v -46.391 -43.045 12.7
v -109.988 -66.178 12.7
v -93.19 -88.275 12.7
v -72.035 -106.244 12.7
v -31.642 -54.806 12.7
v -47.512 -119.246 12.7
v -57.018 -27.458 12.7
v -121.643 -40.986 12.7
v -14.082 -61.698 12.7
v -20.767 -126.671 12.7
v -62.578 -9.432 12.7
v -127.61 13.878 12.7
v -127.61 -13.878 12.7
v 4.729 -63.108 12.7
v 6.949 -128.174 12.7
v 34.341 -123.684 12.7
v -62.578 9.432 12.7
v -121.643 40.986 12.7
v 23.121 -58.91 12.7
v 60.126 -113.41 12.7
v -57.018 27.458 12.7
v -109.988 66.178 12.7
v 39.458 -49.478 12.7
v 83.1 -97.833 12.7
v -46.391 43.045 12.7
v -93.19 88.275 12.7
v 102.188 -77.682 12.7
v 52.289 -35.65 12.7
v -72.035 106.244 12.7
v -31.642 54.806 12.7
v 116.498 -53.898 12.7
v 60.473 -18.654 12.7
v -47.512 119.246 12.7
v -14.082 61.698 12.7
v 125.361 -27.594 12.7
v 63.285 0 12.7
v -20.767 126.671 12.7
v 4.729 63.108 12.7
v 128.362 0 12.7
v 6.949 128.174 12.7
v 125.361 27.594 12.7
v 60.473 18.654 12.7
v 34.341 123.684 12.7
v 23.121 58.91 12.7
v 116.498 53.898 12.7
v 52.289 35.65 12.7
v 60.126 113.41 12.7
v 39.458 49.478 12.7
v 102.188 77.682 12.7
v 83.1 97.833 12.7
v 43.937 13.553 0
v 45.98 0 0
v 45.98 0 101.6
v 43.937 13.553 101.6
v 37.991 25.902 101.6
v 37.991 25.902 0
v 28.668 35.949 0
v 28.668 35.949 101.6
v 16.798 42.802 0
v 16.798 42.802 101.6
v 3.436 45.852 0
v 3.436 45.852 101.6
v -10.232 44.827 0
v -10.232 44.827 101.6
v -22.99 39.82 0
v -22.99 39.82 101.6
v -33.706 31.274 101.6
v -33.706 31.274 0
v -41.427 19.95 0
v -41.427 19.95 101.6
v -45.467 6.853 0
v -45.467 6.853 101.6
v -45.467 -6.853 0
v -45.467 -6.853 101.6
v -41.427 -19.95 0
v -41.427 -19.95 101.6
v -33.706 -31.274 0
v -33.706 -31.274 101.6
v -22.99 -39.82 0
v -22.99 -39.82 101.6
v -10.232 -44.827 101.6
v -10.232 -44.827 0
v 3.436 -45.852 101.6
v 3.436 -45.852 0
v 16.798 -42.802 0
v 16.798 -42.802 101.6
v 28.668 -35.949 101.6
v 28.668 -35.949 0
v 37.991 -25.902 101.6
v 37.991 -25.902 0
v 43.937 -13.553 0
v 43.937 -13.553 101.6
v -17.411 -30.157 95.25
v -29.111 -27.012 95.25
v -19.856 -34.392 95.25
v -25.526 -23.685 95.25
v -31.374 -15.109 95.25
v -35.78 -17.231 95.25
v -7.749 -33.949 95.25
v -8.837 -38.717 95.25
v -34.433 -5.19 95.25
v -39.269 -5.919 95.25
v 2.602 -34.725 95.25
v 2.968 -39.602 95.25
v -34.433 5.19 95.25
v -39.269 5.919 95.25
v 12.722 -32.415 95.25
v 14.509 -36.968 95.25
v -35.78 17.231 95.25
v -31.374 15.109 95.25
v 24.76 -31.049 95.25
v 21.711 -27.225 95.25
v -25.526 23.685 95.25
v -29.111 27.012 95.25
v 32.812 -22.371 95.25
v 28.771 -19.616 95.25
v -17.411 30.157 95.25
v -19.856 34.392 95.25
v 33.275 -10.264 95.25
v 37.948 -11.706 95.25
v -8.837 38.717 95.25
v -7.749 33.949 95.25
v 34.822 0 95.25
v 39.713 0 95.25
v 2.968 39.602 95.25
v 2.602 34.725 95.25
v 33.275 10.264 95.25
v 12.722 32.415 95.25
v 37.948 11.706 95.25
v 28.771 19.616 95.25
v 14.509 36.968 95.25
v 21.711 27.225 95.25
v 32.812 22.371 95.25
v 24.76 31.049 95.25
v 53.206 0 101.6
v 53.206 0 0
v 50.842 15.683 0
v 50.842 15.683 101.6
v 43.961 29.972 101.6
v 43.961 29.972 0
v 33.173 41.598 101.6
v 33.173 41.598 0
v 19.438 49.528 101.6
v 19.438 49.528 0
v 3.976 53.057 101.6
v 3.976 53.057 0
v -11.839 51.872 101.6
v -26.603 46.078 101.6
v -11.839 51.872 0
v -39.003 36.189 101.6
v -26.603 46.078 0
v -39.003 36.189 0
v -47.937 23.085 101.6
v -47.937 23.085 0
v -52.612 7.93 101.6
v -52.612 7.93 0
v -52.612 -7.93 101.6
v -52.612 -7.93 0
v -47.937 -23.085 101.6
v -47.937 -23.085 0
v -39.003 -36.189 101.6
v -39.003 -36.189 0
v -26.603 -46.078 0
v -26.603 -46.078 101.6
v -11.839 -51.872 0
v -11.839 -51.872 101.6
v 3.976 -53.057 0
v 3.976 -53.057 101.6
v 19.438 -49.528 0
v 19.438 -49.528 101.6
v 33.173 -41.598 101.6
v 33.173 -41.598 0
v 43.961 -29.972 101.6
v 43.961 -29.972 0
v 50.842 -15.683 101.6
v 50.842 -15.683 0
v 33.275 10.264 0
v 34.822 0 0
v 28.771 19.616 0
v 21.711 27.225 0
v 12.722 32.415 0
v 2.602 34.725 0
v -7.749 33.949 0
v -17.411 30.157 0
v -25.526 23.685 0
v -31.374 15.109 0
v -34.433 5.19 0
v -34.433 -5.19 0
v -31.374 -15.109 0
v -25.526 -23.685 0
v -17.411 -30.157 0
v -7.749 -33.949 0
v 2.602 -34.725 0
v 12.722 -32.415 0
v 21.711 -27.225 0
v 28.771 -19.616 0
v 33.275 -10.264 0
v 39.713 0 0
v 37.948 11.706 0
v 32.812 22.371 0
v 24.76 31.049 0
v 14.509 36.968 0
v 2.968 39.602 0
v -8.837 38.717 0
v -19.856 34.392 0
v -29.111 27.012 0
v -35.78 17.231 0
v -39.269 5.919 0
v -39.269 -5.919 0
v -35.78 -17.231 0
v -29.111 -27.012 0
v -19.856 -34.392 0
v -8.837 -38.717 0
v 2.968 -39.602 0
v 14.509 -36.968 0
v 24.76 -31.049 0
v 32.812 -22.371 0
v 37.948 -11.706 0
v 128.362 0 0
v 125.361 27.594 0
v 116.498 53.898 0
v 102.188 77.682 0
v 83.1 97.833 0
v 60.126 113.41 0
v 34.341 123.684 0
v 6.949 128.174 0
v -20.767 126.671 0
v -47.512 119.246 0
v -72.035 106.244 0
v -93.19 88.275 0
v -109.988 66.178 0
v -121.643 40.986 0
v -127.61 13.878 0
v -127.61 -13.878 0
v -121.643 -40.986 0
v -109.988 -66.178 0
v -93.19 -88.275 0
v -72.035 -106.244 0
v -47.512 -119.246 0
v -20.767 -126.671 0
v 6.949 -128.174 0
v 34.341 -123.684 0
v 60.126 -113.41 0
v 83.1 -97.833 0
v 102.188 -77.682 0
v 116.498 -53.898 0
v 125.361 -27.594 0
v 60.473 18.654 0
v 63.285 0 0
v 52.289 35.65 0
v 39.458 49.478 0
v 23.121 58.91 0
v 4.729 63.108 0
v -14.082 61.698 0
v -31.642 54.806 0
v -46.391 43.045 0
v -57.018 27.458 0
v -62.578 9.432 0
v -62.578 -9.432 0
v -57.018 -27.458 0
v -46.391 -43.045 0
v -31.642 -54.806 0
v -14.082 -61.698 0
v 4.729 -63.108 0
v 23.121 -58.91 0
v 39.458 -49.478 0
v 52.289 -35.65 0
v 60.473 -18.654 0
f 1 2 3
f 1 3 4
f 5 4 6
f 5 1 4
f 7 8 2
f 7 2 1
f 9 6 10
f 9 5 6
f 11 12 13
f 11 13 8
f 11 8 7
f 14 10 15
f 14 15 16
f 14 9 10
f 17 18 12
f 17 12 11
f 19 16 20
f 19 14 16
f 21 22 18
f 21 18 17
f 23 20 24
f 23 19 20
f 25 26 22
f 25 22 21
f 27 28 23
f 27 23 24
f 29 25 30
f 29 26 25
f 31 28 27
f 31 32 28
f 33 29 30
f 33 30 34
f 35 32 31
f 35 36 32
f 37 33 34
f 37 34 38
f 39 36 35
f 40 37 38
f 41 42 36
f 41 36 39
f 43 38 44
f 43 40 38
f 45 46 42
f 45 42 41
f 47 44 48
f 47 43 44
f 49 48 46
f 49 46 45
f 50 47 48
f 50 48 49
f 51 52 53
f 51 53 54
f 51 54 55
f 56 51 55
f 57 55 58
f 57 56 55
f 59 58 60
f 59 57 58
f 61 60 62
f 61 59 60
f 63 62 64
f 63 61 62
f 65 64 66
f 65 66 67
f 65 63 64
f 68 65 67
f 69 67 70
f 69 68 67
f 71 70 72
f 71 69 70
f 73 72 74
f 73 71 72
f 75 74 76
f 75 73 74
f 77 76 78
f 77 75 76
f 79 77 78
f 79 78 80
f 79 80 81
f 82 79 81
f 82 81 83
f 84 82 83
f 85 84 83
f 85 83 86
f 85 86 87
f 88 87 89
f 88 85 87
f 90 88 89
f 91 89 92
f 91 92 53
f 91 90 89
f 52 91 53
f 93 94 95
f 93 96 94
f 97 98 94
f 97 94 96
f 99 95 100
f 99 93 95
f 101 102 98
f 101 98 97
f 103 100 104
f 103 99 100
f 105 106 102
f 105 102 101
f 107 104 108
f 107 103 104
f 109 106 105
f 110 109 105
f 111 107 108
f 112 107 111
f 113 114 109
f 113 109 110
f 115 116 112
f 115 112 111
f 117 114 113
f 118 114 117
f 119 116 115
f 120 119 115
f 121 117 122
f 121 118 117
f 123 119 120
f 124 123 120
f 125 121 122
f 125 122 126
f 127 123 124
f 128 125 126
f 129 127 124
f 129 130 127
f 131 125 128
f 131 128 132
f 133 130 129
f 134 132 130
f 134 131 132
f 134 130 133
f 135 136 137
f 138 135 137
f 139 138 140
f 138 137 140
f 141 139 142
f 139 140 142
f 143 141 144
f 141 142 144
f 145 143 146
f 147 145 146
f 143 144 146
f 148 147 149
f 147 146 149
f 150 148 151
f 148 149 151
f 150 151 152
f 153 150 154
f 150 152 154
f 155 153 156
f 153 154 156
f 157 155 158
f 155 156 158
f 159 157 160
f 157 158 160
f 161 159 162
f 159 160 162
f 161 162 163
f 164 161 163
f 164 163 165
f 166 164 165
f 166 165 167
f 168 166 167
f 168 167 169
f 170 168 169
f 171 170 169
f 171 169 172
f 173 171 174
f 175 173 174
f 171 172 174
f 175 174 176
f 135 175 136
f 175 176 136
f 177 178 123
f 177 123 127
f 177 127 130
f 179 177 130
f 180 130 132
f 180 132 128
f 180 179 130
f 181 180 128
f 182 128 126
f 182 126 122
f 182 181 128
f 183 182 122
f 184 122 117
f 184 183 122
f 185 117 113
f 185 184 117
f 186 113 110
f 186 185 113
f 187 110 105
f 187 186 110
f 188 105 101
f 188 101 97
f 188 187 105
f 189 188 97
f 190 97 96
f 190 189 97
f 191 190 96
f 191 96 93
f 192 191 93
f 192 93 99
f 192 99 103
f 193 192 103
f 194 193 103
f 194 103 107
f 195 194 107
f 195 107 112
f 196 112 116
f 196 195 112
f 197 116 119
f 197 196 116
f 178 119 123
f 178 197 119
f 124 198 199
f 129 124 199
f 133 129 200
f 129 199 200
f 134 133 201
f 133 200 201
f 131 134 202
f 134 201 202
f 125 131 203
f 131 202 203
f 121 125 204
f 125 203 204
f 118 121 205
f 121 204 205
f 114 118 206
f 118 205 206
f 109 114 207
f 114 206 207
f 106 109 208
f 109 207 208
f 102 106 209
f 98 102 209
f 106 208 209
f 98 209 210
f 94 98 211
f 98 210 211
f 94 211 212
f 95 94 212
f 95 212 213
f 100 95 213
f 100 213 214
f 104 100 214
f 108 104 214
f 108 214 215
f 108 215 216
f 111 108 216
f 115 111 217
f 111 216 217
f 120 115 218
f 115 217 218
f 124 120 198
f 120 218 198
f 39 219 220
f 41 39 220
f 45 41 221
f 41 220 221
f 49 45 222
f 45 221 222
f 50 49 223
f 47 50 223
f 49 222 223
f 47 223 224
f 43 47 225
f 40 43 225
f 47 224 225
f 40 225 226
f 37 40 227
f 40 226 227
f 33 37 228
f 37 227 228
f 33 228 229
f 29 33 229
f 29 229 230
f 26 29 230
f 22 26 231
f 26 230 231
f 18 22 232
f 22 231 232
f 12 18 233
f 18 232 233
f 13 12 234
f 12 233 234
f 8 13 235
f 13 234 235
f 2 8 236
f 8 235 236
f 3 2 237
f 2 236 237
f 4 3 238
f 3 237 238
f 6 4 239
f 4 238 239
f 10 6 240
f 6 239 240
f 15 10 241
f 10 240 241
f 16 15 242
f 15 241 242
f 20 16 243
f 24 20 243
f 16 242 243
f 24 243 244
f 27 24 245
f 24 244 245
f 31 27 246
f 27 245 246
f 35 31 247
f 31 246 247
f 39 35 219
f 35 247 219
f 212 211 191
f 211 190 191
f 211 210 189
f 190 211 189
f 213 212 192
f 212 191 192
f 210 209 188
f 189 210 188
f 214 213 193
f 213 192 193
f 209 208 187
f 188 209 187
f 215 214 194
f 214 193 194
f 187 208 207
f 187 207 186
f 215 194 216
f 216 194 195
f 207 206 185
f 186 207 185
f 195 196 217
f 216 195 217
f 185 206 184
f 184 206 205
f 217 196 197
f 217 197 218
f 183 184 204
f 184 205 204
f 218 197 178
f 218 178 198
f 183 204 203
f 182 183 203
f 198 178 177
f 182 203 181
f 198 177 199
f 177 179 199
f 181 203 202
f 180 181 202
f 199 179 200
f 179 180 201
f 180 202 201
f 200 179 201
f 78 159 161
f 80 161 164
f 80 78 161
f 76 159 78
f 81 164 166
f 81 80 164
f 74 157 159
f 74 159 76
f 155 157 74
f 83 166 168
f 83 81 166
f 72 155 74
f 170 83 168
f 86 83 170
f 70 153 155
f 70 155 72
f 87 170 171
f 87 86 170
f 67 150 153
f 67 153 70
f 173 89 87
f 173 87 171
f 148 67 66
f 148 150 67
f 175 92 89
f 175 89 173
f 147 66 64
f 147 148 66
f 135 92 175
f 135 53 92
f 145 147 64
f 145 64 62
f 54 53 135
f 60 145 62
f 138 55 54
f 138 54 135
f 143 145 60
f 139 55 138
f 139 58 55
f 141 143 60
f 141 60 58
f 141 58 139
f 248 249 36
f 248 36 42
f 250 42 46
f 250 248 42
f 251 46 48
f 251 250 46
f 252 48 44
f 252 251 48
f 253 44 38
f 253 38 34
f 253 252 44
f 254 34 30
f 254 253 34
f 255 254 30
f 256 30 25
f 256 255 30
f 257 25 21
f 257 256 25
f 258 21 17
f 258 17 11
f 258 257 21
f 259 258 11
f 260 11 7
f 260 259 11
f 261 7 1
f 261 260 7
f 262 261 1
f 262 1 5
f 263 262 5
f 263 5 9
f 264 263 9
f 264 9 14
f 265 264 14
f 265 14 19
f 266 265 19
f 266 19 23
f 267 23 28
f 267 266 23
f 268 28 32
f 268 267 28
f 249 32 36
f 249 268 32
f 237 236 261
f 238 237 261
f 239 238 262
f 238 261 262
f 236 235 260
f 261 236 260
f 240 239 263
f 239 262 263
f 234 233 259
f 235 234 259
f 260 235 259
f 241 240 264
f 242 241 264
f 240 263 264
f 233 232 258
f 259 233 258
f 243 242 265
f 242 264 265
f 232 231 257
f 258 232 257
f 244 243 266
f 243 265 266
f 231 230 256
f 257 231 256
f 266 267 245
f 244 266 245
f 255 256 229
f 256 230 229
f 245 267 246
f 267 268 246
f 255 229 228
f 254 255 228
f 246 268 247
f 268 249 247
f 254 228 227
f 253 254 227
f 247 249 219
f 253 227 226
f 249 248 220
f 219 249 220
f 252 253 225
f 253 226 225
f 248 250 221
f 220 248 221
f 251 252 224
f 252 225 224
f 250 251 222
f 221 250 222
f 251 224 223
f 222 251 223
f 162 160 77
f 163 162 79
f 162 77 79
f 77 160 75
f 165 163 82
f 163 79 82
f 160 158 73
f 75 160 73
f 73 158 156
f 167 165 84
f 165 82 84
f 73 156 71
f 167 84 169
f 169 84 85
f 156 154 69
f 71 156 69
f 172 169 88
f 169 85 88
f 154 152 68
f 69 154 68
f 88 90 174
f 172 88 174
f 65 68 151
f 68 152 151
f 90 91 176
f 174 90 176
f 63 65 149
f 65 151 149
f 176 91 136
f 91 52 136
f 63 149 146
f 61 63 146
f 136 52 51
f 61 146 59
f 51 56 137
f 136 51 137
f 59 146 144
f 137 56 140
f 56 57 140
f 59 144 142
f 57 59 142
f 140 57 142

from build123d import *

# Parameters (mm, degrees)
F0_R     = 53.2061517891
F0_R_2   = 45.9801933219
F1_DEPTH = 101.6
F3_R     = 39.7127386475
F3_R_2   = 34.8221258387
F4_DEPTH = 95.25
F5_R     = 128.3623160329
F5_R_2   = 63.2849782705
F6_DEPTH = 12.7


# Not quite as in the source:
# - the program builds the solid bodies; features that only make, move or delete a surface that nothing else refers to are left out


with BuildPart() as f1:
    # F0 (on Top) → F1 (new body)
    with BuildSketch(Plane.XY):
        Circle(F0_R)
        Circle(F0_R_2, mode=Mode.SUBTRACT)
    extrude(amount=F1_DEPTH)


with BuildPart() as f4:
    # F3 (on Top) → F4 (new body)
    with BuildSketch(Plane.XY):
        Circle(F3_R)
        Circle(F3_R_2, mode=Mode.SUBTRACT)
    extrude(amount=F4_DEPTH)


with BuildPart() as f6:
    # F5 (on Top) → F6 (new body)
    with BuildSketch(Plane.XY):
        Circle(F5_R)
        Circle(F5_R_2, mode=Mode.SUBTRACT)
    extrude(amount=F6_DEPTH)


solid = Compound([f1.part, f4.part, f6.part])
